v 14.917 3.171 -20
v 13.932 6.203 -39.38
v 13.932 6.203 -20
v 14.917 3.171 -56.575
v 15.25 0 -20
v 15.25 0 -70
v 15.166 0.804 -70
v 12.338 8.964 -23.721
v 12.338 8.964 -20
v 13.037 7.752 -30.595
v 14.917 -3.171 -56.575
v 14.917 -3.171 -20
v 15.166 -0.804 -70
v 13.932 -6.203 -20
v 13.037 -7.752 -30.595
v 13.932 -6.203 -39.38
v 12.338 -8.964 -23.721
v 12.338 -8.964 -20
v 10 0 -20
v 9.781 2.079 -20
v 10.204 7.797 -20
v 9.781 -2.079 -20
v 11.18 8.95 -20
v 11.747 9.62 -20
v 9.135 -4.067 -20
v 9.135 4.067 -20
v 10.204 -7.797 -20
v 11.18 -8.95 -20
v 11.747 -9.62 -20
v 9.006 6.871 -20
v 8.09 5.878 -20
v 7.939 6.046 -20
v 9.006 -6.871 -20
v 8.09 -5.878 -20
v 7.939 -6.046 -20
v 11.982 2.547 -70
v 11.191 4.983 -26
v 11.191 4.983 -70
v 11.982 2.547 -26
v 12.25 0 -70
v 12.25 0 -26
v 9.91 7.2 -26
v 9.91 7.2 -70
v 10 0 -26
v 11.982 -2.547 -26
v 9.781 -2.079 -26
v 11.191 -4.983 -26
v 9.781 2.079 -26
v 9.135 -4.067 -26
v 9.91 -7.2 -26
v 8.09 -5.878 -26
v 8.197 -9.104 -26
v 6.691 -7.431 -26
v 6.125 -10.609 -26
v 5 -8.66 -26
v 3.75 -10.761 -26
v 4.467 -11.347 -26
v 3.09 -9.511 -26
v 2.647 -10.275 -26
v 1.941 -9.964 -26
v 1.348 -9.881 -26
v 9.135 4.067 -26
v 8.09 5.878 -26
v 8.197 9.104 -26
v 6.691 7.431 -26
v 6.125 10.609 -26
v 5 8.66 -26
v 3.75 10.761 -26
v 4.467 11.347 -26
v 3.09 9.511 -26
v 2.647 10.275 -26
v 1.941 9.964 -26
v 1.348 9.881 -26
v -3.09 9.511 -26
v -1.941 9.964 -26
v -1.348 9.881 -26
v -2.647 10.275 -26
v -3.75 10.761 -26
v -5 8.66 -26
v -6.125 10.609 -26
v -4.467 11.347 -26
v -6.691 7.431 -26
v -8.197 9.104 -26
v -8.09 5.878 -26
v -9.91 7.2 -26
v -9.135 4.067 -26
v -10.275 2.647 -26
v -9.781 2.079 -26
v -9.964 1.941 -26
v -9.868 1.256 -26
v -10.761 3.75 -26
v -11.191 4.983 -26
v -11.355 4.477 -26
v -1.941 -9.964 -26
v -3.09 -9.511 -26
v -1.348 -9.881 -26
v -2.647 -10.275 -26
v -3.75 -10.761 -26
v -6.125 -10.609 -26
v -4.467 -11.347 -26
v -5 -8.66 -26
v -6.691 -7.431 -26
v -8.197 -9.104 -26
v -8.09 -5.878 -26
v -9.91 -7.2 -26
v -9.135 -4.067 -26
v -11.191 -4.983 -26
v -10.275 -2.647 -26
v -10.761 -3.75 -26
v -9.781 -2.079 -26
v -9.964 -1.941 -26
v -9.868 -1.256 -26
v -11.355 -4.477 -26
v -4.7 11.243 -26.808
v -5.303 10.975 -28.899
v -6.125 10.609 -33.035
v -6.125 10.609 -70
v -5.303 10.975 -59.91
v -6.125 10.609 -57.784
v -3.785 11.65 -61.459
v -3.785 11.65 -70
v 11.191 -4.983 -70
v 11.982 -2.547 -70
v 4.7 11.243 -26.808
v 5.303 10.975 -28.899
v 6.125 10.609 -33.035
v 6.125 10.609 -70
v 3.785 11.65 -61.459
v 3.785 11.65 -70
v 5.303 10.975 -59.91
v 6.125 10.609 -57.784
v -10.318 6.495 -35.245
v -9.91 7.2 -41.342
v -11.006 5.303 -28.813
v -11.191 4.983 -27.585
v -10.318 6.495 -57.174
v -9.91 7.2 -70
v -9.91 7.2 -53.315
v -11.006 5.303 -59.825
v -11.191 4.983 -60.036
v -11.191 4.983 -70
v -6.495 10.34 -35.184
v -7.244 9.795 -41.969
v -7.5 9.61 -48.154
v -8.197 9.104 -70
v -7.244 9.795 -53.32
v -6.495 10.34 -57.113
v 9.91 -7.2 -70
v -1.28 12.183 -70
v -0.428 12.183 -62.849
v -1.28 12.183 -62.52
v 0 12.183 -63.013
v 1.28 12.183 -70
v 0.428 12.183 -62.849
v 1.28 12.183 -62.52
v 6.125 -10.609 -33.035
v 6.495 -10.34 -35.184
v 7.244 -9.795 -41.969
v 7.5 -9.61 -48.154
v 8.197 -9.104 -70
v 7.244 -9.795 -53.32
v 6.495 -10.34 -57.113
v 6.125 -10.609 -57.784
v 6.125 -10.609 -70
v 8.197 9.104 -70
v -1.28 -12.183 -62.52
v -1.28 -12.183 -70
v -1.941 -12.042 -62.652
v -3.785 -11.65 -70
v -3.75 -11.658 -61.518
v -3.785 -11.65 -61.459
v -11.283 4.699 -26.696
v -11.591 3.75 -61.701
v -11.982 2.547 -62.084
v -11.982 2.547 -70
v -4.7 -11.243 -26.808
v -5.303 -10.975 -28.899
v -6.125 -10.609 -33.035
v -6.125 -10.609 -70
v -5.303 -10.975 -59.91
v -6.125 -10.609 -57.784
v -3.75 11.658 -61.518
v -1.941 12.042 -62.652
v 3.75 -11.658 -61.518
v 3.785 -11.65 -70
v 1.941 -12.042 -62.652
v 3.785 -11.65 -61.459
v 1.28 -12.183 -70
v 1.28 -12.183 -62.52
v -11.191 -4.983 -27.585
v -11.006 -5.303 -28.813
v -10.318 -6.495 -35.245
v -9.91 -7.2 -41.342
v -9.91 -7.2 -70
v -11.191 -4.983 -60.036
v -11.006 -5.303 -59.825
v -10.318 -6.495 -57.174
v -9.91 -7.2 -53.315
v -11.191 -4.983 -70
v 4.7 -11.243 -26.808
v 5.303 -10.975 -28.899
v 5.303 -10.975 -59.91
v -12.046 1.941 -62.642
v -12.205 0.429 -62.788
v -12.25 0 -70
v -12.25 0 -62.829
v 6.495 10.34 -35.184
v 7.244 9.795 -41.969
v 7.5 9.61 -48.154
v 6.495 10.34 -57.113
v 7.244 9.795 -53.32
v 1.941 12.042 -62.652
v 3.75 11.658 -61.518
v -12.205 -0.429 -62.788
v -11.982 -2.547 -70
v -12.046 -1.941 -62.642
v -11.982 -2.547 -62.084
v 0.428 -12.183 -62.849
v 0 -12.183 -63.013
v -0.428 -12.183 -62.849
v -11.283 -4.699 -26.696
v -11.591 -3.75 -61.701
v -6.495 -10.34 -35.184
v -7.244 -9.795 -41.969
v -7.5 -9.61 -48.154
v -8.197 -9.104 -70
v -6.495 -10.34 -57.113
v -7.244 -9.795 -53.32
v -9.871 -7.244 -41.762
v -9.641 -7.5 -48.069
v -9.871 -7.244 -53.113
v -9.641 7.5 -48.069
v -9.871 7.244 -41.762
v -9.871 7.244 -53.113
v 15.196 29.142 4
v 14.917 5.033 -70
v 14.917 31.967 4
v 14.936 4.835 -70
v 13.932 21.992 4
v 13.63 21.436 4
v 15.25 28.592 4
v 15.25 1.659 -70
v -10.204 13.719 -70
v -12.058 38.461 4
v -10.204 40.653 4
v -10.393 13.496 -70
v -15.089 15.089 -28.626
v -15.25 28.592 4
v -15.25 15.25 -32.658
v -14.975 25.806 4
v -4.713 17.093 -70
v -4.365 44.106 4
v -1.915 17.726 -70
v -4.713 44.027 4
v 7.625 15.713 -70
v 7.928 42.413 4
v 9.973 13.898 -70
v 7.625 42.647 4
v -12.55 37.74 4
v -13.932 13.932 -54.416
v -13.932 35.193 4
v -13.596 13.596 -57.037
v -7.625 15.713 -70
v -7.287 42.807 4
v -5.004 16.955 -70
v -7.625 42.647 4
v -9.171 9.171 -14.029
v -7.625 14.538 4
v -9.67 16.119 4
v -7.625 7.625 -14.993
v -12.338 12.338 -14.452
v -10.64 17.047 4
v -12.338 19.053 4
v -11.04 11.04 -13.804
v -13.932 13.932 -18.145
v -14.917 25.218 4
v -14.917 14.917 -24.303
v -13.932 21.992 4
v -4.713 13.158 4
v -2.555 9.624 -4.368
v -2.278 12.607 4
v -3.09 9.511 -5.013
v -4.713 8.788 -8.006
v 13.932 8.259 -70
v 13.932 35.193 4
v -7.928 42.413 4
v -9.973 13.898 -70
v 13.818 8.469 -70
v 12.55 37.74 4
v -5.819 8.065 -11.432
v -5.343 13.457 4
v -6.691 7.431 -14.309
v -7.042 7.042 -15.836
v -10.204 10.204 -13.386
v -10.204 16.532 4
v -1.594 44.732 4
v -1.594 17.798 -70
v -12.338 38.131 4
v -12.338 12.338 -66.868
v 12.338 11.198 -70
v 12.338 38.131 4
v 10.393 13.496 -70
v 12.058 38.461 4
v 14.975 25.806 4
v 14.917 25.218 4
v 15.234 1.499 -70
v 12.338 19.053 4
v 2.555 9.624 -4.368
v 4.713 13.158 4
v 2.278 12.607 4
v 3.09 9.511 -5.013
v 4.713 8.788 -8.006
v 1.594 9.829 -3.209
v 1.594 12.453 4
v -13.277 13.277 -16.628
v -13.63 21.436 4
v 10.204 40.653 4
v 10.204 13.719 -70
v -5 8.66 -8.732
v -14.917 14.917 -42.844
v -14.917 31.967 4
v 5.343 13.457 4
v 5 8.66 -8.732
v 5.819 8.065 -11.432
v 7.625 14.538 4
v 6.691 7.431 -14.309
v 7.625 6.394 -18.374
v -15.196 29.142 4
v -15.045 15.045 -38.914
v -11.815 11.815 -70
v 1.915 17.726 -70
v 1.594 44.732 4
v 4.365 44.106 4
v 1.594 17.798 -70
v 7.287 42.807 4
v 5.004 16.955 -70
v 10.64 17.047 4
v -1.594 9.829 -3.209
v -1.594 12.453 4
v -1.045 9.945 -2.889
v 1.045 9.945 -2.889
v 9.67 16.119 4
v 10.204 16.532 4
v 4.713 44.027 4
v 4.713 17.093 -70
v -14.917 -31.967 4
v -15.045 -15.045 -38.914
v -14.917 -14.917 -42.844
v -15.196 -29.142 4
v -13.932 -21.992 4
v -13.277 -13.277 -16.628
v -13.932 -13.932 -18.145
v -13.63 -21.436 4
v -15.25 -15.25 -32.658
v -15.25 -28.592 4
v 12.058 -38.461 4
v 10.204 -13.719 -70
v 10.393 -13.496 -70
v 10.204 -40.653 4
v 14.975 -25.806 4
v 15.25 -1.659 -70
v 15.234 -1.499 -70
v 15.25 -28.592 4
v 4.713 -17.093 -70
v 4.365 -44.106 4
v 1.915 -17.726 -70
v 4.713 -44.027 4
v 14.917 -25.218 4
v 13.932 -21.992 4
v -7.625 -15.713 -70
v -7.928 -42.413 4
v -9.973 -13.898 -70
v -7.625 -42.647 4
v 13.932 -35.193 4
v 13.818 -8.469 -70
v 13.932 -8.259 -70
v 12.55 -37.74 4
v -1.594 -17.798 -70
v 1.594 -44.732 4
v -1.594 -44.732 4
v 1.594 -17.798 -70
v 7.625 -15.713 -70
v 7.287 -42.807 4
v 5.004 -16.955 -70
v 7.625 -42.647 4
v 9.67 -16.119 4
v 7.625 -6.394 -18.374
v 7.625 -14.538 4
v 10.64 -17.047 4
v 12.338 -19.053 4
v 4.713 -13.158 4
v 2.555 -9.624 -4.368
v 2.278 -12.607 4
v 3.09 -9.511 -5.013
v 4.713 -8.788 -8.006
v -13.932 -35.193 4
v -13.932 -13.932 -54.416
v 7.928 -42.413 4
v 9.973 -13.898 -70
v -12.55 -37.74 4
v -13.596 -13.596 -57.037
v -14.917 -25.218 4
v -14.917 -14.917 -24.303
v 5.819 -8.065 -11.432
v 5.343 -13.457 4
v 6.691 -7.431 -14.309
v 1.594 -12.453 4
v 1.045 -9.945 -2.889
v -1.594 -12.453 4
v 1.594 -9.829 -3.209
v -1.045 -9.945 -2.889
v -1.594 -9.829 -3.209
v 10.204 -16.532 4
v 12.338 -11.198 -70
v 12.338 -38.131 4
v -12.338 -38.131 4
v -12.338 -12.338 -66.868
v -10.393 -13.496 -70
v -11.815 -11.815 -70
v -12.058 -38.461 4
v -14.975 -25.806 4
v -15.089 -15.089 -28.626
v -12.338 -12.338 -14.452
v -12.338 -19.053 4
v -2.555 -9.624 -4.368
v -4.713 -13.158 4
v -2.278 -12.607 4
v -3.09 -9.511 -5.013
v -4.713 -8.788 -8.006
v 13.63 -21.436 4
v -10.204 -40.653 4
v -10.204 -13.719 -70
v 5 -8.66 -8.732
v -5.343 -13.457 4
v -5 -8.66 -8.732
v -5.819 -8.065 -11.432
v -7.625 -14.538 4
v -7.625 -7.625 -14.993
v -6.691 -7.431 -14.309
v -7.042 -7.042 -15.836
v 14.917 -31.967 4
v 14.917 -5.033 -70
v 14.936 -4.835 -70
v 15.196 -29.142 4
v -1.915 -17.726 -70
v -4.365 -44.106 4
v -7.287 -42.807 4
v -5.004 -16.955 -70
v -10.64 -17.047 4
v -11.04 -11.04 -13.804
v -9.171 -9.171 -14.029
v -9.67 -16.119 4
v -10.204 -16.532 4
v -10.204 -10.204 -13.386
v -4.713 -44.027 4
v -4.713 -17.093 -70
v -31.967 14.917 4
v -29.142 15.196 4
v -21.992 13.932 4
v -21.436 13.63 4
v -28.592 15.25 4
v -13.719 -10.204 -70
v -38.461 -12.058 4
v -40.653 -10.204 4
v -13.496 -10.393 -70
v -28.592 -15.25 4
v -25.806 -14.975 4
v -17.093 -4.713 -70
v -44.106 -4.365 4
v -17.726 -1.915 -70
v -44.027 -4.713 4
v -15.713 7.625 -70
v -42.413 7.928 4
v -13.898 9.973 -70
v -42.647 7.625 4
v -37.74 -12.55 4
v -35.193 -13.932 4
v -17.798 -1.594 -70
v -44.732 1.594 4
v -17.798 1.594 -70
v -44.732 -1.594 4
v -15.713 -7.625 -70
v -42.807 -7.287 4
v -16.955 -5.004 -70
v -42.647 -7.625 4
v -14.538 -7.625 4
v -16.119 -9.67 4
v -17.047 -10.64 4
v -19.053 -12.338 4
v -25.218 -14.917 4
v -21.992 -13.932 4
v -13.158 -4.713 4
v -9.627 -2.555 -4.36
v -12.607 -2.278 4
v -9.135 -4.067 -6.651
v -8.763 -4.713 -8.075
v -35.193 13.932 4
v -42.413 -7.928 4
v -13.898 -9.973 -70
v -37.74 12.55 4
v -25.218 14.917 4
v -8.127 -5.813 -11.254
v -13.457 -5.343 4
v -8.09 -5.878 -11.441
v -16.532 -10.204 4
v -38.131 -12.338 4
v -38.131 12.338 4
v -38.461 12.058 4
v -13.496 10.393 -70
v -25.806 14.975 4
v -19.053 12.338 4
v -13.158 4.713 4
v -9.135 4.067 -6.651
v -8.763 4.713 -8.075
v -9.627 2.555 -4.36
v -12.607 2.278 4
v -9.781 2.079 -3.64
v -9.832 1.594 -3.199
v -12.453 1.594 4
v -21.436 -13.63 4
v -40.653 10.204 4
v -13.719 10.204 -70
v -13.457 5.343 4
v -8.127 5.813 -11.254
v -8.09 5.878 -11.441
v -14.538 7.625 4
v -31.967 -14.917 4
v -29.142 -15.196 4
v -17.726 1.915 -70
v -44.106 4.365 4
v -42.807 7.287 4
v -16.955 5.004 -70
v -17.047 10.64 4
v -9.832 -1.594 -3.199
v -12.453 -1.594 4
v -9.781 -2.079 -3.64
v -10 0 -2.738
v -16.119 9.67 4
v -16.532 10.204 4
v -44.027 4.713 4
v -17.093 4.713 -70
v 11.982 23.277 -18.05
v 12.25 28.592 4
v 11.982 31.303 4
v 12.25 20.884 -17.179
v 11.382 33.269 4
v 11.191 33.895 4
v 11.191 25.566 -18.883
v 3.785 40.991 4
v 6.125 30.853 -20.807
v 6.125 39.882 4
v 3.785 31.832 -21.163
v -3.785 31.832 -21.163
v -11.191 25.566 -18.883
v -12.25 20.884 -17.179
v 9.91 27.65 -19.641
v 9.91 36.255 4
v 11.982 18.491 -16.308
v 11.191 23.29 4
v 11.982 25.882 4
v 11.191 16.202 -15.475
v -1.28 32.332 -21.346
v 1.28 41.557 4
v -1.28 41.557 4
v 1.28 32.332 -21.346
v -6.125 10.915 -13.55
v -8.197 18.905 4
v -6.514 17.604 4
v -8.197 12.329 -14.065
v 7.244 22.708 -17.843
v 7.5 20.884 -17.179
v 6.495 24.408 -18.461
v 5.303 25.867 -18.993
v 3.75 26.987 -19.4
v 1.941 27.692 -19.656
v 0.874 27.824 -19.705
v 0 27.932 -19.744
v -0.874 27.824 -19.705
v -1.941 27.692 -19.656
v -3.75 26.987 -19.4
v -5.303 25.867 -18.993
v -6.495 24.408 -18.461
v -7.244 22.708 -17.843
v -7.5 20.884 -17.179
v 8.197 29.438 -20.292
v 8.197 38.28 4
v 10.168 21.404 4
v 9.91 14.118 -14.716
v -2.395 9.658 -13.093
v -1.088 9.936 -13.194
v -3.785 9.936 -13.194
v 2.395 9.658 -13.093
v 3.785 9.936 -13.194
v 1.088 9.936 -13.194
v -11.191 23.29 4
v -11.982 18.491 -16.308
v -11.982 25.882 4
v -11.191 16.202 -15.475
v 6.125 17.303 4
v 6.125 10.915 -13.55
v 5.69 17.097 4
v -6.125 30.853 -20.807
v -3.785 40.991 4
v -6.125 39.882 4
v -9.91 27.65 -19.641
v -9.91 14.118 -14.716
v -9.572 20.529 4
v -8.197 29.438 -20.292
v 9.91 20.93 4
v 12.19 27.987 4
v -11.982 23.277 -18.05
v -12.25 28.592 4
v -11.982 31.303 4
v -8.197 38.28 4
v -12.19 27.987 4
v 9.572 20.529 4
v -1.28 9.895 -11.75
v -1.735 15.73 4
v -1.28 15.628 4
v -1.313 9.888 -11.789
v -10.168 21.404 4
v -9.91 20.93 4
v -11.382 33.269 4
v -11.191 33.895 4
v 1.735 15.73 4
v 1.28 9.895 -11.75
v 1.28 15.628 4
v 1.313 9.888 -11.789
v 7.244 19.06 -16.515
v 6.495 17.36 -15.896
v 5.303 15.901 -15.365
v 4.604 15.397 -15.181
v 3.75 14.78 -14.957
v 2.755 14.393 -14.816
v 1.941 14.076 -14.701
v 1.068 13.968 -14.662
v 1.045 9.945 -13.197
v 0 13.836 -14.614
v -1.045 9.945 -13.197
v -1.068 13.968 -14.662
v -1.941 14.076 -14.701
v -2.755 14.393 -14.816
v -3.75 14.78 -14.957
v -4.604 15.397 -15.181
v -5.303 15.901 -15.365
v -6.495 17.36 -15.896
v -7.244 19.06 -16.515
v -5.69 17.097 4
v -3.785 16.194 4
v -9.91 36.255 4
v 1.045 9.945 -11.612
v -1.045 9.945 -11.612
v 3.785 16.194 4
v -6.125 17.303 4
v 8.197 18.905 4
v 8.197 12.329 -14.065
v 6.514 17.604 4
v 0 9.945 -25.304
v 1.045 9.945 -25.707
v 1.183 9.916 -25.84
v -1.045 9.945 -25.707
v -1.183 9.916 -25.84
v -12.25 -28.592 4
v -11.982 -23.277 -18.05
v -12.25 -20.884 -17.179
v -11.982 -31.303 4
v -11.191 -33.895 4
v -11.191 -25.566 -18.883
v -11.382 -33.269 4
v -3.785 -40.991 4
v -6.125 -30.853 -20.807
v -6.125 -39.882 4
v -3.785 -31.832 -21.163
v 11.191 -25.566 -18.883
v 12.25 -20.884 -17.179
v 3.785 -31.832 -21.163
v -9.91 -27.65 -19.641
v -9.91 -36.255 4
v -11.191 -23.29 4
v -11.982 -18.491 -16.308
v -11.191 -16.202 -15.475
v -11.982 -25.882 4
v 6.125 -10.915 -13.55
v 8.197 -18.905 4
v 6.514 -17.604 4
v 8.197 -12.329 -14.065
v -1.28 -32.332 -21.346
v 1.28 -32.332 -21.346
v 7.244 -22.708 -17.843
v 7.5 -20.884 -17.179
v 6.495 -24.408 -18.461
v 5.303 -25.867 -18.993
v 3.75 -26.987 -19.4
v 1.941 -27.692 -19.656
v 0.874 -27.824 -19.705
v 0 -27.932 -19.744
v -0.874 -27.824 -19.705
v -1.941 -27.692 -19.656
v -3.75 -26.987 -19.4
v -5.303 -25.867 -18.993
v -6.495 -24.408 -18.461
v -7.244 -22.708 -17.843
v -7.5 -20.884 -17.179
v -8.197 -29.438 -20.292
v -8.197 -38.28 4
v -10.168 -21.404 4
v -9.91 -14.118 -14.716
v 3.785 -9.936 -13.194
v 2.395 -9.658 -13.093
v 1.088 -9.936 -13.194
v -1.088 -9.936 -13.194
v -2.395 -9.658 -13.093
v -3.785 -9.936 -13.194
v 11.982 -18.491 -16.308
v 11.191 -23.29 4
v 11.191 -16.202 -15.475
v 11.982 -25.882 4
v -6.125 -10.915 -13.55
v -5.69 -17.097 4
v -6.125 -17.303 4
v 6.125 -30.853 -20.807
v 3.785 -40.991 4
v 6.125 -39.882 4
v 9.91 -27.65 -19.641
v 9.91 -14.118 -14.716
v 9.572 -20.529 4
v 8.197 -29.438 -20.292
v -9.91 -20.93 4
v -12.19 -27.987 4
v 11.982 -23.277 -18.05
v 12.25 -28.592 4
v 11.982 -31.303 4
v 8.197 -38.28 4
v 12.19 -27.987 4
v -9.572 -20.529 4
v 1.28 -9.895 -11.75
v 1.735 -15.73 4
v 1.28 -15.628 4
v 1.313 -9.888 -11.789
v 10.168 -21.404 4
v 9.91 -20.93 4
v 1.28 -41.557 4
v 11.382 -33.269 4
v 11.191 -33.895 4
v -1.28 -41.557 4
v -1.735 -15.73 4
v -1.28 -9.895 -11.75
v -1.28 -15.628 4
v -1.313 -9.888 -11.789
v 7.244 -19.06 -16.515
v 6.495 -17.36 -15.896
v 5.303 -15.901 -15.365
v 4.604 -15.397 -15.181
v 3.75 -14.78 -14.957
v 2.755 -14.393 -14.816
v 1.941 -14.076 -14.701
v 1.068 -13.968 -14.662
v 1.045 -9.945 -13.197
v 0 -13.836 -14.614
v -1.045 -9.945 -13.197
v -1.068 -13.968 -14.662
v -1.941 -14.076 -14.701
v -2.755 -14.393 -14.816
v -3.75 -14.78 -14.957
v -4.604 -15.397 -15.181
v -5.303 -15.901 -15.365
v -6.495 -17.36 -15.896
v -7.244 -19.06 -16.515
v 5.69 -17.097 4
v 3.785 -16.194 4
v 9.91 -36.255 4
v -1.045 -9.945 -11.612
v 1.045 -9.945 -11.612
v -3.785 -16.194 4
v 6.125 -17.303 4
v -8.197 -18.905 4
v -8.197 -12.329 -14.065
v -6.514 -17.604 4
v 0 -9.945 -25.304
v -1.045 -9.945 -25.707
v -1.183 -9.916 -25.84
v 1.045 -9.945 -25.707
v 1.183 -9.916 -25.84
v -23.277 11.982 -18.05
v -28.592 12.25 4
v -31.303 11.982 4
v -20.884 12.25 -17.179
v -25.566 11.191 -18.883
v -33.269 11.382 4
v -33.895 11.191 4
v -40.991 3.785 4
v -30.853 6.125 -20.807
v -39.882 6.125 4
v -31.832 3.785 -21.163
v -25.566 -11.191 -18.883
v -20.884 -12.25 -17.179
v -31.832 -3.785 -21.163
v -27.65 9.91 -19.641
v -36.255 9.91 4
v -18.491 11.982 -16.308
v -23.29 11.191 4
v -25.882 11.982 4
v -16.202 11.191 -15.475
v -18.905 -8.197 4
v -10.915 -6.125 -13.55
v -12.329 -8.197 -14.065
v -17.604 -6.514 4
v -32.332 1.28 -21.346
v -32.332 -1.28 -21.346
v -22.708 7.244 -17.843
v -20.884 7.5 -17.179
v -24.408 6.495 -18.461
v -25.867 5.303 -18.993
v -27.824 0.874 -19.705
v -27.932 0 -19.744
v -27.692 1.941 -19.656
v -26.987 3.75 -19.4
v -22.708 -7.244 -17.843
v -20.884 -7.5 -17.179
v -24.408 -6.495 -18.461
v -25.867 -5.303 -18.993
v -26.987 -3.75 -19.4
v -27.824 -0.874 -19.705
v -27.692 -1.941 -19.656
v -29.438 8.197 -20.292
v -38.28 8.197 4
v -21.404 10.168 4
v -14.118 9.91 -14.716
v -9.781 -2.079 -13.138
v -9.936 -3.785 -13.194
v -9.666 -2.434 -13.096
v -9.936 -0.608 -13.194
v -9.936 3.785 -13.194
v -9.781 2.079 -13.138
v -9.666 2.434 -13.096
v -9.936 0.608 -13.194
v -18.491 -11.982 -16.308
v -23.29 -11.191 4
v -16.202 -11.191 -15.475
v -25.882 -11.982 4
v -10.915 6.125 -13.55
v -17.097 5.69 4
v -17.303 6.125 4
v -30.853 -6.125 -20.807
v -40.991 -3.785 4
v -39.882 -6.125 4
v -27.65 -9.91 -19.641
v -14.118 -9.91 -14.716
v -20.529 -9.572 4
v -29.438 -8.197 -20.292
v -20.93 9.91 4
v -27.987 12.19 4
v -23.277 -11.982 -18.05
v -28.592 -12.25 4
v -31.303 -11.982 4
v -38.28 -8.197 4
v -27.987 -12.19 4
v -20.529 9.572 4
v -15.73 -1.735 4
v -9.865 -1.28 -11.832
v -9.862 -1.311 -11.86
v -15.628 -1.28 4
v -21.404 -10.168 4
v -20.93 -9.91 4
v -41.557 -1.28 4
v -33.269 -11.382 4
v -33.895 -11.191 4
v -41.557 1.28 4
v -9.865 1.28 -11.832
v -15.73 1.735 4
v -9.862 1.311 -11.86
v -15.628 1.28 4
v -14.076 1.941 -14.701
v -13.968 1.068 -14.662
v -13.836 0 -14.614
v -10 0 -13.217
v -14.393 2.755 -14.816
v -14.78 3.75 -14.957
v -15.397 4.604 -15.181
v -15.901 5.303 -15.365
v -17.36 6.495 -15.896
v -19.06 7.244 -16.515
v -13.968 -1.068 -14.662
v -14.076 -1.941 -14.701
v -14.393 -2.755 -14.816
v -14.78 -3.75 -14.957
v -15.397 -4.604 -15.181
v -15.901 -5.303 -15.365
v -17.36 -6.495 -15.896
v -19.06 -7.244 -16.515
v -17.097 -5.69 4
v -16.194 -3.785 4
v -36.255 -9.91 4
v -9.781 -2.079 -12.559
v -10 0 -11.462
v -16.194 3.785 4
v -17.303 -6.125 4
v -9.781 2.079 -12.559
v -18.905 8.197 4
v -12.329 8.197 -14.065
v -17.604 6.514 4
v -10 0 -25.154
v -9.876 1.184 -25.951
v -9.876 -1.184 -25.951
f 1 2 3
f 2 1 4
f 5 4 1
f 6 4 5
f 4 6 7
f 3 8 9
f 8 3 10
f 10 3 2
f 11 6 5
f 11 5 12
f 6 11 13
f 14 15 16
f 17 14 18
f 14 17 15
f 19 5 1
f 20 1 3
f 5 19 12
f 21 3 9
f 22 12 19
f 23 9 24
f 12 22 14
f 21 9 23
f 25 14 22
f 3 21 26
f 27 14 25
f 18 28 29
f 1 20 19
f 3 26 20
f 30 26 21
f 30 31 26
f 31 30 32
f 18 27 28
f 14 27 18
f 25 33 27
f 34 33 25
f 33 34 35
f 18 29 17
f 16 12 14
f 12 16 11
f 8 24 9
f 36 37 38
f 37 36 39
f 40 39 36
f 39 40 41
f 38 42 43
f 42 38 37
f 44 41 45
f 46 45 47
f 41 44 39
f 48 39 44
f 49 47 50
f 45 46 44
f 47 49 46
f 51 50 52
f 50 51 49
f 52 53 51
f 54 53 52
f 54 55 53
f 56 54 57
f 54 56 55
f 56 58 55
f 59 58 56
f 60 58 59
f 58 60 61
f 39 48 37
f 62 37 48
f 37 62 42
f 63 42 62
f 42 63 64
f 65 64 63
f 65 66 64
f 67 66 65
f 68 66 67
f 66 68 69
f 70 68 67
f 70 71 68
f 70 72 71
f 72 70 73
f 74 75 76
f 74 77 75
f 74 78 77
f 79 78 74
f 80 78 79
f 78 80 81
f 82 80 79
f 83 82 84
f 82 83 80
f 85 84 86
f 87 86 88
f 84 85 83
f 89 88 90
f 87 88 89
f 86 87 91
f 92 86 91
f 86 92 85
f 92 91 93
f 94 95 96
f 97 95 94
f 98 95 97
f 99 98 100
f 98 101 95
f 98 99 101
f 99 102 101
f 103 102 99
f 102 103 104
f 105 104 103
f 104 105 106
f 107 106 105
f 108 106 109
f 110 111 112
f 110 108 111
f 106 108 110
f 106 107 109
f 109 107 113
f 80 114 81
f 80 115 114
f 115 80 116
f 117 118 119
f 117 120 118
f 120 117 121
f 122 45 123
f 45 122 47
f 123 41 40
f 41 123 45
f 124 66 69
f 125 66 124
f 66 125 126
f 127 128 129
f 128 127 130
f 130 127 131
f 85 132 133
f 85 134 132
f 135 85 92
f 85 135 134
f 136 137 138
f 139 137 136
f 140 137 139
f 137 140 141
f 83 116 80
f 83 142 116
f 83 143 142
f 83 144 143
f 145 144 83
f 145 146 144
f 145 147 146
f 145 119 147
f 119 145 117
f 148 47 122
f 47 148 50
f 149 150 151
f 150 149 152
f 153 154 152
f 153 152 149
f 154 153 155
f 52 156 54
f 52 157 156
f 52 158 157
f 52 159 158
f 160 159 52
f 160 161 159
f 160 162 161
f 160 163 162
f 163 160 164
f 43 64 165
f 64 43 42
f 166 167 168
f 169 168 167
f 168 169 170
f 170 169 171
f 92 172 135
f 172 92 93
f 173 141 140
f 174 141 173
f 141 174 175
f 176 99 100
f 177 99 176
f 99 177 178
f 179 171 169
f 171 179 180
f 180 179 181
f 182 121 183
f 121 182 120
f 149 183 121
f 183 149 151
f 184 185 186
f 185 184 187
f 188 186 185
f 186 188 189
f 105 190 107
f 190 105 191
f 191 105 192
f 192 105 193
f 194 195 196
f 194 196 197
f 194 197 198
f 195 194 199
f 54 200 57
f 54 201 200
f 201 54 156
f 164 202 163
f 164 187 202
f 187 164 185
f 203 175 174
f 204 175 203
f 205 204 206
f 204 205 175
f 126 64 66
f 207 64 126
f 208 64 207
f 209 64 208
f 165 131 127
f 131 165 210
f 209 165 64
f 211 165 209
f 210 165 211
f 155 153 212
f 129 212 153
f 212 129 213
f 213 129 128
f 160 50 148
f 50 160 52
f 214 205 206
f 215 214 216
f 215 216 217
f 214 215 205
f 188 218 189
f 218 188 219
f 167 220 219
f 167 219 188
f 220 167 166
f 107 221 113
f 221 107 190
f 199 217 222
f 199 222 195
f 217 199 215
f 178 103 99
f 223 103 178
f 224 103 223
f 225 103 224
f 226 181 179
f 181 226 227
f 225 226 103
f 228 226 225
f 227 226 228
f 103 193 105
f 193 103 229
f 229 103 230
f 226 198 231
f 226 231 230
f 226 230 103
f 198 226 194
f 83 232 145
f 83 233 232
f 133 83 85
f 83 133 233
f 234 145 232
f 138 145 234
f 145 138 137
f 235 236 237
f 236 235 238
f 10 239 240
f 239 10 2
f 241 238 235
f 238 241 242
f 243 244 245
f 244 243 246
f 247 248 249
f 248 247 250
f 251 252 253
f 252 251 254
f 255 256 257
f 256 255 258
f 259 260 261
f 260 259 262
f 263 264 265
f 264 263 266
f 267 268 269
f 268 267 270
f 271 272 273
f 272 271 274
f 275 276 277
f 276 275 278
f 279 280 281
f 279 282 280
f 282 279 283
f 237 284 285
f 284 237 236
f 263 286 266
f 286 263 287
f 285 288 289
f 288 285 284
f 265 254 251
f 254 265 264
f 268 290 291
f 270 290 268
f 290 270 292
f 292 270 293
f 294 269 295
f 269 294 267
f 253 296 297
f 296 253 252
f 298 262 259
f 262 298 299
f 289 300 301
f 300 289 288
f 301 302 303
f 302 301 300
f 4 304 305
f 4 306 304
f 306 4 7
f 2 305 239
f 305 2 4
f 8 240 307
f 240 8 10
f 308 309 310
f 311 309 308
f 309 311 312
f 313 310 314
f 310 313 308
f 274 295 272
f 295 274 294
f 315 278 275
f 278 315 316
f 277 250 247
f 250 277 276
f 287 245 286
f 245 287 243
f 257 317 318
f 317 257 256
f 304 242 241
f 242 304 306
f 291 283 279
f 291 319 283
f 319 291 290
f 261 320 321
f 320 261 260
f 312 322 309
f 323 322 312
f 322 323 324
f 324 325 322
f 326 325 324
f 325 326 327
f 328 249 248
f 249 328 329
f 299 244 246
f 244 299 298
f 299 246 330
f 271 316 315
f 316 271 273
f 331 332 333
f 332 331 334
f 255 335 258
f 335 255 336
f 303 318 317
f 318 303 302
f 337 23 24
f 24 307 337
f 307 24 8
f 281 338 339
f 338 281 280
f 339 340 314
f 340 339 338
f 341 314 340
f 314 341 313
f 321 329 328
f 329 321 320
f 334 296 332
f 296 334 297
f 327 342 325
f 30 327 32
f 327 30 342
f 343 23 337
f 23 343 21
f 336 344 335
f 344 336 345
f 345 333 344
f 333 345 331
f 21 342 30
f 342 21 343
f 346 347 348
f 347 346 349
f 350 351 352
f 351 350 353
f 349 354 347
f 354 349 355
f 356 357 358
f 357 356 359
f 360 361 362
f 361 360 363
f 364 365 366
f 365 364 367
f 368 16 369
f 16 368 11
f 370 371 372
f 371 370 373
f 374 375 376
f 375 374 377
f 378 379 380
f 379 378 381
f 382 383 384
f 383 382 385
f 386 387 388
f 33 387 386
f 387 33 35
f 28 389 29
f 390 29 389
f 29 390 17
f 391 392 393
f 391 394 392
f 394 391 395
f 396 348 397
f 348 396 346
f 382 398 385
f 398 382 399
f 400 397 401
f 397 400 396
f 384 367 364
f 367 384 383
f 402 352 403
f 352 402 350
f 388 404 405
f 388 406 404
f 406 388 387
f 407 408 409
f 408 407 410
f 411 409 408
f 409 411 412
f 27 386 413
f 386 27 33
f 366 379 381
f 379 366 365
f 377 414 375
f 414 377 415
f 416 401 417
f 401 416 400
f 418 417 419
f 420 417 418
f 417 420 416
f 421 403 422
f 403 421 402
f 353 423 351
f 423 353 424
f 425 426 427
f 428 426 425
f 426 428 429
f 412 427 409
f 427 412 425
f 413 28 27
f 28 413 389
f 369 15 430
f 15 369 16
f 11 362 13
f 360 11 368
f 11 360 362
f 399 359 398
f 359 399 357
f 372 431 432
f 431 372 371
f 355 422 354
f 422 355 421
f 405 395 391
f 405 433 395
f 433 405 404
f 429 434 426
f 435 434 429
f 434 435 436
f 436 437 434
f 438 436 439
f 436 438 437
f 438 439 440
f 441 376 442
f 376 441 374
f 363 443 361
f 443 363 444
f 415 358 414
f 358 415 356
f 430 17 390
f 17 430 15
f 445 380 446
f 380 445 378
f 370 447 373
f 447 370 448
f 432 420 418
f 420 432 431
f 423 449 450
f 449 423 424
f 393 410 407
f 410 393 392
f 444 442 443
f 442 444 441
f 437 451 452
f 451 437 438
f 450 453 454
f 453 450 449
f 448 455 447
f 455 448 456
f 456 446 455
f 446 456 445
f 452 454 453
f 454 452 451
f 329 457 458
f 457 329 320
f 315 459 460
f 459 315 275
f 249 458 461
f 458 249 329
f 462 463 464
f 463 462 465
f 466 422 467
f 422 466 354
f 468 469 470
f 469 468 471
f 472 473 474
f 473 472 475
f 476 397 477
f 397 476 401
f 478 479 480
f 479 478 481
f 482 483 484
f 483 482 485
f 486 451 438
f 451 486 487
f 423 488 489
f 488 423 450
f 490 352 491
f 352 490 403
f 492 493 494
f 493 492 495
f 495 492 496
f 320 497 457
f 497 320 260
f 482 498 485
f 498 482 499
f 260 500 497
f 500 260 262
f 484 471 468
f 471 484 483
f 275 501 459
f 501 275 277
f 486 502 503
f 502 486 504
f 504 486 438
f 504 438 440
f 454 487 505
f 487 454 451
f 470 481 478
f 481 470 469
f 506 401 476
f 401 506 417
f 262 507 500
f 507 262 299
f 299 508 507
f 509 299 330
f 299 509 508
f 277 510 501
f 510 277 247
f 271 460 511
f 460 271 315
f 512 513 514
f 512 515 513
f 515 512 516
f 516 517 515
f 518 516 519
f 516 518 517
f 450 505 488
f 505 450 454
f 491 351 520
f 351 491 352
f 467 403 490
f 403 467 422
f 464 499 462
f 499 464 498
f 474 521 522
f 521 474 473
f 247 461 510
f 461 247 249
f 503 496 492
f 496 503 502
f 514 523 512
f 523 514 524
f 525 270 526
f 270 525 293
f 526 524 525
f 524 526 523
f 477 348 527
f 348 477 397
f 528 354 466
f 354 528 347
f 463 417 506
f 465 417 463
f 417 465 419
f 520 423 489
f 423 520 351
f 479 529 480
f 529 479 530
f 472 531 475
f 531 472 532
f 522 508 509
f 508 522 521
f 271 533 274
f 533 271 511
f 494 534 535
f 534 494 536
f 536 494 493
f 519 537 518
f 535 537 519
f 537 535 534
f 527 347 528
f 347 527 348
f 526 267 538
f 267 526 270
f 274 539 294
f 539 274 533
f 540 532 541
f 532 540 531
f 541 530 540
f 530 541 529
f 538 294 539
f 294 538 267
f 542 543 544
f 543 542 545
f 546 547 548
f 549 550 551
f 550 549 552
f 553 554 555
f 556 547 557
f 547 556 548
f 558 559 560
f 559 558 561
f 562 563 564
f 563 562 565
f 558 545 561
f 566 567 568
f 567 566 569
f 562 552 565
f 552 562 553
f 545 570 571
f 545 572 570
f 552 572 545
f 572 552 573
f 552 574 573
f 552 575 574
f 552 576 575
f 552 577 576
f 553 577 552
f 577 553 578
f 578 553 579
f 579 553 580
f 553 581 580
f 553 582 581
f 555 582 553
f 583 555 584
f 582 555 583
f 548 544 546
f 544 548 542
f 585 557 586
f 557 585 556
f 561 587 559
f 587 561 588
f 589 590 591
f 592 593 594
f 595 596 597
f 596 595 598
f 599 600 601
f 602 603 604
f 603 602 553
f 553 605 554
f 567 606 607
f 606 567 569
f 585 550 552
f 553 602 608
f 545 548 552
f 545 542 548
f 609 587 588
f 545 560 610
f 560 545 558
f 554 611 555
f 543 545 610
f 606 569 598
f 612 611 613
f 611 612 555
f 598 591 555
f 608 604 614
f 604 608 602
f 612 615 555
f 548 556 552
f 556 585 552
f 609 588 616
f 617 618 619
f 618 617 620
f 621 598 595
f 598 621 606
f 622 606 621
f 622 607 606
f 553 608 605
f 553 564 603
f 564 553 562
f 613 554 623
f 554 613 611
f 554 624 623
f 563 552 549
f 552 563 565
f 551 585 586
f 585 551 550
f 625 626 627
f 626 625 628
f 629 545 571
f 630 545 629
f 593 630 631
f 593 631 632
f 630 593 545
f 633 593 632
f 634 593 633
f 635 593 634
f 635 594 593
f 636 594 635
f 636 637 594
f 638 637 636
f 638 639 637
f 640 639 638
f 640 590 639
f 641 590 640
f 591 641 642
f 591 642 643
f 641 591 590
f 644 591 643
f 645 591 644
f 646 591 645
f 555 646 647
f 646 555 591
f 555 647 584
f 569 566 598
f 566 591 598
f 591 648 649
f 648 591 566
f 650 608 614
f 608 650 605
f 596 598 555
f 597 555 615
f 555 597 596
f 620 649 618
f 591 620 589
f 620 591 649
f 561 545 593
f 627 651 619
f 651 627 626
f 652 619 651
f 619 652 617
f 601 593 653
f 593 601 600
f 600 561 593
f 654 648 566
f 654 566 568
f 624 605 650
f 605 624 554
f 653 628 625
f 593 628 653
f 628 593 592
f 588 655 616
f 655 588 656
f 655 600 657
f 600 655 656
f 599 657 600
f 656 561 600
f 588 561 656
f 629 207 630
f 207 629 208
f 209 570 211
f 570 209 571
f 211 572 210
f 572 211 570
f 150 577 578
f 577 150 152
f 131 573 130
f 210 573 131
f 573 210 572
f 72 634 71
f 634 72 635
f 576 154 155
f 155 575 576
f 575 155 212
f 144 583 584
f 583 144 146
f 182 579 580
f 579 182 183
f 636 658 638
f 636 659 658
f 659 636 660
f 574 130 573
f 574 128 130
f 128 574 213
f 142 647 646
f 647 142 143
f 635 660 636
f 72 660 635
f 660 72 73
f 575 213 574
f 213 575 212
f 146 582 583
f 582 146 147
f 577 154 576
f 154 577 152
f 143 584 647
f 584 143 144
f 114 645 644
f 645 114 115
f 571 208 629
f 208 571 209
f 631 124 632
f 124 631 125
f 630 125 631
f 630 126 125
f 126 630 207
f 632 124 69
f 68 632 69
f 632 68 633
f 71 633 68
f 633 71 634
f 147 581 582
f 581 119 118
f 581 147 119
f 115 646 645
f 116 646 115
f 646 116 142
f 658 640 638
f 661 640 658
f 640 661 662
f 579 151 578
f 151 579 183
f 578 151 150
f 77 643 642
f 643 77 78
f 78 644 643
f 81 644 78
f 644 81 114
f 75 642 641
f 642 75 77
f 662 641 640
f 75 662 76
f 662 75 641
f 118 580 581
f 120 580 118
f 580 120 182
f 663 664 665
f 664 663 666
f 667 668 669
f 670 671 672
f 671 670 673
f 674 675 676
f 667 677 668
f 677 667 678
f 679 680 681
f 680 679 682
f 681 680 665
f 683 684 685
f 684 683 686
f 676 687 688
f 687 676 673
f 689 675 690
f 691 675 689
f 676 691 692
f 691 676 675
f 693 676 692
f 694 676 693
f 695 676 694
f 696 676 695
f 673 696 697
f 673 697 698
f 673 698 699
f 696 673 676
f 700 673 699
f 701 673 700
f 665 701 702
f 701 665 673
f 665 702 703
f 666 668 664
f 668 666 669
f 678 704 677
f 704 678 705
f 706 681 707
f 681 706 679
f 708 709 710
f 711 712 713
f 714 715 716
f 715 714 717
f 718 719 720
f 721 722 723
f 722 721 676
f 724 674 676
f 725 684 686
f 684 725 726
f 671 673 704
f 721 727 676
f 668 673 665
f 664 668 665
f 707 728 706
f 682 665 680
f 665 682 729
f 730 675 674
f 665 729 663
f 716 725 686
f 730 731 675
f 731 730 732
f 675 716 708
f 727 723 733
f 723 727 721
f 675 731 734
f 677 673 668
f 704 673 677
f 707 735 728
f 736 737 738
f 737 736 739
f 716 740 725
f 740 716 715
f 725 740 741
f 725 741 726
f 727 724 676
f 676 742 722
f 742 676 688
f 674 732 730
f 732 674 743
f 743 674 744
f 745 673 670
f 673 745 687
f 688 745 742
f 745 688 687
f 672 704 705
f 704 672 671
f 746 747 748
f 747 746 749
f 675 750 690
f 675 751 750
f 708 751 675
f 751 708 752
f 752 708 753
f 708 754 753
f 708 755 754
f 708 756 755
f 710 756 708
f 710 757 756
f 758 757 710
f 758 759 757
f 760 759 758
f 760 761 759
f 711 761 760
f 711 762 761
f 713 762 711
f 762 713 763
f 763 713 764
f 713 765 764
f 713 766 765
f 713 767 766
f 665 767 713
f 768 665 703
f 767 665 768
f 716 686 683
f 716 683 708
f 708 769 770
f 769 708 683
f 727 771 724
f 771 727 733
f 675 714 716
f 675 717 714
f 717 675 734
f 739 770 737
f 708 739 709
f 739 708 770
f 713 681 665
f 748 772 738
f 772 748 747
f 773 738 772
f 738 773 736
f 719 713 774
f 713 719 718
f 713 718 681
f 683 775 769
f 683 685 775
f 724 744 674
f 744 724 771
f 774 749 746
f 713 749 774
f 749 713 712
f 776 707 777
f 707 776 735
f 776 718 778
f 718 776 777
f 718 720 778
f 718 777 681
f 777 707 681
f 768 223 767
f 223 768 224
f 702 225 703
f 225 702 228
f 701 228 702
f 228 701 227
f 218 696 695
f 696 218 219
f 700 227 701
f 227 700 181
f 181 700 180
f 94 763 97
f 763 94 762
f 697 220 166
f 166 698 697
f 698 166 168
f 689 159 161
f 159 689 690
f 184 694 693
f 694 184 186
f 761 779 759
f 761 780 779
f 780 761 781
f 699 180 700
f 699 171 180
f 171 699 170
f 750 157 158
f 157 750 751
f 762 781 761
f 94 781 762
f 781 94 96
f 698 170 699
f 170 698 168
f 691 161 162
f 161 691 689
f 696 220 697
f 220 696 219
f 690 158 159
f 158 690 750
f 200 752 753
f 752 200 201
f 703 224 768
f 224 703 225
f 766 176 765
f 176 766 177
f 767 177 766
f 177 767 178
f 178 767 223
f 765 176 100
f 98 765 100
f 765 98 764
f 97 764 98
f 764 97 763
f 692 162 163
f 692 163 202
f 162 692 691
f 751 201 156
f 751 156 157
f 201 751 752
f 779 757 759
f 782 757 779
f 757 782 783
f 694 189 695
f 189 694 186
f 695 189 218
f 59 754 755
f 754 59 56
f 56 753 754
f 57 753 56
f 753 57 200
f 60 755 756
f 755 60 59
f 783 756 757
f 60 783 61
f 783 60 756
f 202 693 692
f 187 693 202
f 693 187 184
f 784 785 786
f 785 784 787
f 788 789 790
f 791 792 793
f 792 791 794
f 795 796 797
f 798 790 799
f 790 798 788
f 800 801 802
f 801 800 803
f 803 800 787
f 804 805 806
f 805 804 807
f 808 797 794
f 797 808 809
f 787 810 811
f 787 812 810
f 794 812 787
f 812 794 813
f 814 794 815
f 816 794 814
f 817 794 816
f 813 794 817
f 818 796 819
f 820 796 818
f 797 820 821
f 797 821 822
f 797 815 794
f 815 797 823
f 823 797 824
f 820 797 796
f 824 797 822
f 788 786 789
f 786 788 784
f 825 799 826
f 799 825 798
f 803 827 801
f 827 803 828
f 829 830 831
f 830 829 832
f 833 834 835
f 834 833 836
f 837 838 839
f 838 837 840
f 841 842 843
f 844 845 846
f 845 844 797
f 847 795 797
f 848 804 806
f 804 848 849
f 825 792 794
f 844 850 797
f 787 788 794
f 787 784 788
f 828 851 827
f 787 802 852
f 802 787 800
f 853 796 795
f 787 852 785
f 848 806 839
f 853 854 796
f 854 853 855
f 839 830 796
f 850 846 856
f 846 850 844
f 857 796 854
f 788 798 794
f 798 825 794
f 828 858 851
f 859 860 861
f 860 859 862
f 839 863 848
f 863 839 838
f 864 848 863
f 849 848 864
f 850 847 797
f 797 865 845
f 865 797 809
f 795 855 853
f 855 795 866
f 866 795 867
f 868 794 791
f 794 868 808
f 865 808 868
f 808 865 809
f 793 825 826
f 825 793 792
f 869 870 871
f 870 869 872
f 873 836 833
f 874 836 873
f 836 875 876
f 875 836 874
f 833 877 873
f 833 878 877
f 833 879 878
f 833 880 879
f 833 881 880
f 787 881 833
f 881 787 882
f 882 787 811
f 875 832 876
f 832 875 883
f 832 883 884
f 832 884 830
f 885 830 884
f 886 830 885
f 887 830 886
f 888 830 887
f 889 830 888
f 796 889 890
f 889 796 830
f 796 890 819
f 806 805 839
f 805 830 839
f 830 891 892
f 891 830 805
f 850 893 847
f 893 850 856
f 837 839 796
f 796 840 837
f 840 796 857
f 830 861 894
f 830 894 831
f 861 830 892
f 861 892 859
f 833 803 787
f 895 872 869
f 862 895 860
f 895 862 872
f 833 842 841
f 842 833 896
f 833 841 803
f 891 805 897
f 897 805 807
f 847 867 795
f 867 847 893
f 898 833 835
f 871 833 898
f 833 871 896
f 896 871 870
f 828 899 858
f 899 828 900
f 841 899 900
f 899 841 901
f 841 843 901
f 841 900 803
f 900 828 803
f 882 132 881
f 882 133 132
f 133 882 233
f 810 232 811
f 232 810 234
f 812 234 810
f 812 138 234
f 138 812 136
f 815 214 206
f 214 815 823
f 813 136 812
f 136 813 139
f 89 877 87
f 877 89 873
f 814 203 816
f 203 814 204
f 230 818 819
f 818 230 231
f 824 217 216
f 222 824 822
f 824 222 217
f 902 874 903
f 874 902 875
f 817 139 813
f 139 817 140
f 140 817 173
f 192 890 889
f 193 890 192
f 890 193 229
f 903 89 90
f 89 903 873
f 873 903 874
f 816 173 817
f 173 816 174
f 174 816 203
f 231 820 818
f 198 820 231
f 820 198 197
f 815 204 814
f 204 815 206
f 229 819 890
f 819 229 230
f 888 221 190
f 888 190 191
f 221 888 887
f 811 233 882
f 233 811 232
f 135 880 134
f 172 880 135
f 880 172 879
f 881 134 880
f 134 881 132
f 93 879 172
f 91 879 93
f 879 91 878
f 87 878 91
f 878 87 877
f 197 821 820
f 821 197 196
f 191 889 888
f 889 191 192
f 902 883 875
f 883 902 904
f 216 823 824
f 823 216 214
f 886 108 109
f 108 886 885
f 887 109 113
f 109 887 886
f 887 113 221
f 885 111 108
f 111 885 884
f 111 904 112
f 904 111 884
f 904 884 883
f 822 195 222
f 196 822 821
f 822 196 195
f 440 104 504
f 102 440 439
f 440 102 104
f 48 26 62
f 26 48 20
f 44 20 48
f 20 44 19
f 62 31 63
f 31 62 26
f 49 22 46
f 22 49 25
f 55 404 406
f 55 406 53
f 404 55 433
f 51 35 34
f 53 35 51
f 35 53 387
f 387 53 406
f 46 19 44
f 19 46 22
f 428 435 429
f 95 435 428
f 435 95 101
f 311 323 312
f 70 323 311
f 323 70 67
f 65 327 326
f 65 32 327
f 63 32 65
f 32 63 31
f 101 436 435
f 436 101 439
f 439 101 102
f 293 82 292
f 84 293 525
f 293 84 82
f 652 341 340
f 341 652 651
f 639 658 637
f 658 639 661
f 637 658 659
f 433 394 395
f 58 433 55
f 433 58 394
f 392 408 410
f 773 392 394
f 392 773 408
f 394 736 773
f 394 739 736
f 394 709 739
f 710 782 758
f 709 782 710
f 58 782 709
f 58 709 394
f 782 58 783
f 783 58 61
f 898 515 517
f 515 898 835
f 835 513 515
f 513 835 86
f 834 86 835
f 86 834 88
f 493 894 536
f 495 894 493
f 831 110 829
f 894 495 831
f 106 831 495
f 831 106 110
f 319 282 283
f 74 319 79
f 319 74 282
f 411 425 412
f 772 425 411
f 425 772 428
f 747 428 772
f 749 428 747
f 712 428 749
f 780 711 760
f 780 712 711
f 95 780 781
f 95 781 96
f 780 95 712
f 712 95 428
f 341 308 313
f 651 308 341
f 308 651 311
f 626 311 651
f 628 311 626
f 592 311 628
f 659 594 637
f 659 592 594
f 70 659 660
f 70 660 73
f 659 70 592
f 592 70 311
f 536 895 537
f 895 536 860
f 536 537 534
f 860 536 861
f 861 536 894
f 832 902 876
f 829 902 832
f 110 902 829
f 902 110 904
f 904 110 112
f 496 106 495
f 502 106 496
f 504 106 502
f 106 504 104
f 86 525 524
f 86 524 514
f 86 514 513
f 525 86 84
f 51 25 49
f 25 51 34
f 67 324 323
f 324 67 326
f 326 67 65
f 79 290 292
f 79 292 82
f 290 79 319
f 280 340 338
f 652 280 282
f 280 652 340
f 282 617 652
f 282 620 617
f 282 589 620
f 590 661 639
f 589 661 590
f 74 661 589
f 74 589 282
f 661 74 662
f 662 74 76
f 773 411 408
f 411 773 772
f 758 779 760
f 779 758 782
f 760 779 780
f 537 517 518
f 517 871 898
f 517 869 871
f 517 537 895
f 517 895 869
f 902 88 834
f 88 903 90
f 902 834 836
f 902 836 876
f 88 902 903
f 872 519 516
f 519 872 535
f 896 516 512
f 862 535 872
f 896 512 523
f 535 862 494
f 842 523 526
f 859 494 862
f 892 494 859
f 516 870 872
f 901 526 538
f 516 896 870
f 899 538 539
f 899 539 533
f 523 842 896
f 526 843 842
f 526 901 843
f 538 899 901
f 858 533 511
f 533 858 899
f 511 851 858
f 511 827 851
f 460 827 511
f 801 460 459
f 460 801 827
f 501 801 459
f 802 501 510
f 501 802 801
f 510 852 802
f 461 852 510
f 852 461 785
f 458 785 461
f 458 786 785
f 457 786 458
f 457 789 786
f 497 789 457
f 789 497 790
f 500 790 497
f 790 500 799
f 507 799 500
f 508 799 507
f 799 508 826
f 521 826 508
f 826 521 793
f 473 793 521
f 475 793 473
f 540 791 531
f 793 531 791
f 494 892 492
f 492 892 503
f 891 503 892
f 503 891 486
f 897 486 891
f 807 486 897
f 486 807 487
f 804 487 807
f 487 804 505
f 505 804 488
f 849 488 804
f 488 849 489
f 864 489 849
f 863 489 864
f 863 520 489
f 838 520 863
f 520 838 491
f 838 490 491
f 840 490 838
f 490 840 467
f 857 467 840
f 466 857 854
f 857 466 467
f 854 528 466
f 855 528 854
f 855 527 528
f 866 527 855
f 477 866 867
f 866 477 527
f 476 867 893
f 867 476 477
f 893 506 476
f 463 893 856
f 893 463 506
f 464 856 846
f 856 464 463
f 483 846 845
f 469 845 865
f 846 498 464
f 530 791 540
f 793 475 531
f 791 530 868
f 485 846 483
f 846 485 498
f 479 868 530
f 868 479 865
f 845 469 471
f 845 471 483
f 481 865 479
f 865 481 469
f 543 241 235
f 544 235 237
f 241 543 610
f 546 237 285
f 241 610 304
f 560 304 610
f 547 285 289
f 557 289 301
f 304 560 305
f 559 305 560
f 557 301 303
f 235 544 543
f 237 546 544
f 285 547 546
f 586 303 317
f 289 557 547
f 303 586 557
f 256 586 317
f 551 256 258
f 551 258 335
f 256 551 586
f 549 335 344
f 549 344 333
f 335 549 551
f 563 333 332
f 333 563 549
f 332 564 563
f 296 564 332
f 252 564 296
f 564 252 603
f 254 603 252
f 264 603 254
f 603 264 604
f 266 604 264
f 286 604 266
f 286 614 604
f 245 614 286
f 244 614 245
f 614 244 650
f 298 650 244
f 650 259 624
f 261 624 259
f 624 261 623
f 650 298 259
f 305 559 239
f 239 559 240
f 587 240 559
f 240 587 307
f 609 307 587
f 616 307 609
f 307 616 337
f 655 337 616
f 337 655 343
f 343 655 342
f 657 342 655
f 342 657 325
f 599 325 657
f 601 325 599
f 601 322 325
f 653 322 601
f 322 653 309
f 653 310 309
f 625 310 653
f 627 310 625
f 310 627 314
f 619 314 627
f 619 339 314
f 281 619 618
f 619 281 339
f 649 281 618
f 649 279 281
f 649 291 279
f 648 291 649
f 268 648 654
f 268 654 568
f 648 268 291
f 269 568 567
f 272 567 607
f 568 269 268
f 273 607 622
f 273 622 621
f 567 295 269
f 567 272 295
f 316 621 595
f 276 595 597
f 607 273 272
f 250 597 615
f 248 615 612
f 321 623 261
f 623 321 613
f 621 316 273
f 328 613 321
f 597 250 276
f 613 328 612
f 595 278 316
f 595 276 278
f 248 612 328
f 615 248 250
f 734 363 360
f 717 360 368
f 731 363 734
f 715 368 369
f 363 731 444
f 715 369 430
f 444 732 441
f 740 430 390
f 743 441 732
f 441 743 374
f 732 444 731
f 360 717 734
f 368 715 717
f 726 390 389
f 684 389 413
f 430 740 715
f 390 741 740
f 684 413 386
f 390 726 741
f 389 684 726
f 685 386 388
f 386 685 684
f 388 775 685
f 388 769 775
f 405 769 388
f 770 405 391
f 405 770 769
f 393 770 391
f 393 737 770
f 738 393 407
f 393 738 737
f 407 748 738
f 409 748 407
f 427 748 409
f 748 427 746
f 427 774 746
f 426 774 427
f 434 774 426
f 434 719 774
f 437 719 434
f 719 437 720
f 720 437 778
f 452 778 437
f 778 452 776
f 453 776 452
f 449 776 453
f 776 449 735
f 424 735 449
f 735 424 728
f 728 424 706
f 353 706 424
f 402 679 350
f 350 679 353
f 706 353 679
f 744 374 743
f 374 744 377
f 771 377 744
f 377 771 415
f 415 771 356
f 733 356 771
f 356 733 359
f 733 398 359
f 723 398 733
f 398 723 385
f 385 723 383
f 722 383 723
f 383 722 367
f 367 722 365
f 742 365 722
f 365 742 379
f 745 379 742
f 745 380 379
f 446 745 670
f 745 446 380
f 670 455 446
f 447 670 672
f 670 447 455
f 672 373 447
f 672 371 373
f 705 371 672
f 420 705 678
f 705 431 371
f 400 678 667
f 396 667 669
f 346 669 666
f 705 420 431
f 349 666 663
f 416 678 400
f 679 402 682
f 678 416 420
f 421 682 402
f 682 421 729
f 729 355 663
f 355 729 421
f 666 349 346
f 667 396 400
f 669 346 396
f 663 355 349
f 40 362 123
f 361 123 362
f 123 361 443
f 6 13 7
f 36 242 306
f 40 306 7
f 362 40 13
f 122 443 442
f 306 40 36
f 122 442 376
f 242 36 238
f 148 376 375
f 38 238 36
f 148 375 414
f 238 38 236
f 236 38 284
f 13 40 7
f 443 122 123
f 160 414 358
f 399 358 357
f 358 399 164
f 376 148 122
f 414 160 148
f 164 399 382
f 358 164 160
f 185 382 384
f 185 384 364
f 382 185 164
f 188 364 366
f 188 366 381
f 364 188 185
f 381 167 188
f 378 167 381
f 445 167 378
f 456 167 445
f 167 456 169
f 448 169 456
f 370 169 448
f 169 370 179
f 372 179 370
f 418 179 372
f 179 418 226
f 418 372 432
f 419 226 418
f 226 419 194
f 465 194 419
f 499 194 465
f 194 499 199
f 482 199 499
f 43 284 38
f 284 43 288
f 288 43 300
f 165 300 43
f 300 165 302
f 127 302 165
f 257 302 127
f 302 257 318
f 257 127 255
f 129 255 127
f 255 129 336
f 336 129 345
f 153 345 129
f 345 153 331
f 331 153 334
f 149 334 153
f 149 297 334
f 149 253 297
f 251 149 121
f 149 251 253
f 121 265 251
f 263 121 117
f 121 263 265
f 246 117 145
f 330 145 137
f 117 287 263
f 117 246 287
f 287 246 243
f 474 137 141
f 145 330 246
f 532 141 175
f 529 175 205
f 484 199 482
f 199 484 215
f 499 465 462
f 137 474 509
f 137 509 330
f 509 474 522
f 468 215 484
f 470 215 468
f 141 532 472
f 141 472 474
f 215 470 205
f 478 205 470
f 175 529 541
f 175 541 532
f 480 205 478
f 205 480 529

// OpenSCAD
// file: lib.scad
OD = 24.5;

module tube(od, id, h){
  difference(){
    color([1, .3, .6])cylinder(d=od, h=h);
    translate([0, 0, -1])cylinder(d=id, h=h + 2);
  }
}
// main file
include <lib.scad>

ID = 20;
angle = 20;
thickness=6;

module leg(){
  rotate([-angle, 0, 0])translate([0, OD+1, -9])cylinder(d=OD, h = 100);
  rotate([-angle, 0, 0])translate([0, OD+1, -99])cylinder(d=15, h = 200);
}
module insert(){
  color("red")
  rotate([-angle, 0, 0])translate([0, OD+1, -70])cylinder(d=OD + thickness, h = 100);
}

module legs(){
  leg();
  rotate([0, 0, 180])leg();
  rotate([0, 0, 90])leg();
}
module inserts(){
  insert();
  rotate([0, 0, 180])insert();
  rotate([0, 0, 90])insert();
}

module manifold(){
  translate([0, 0, -90])
    difference(){
    cylinder(h=70, d=OD + thickness);
    translate([0, 0, -thickness])cylinder(h=70, d=OD);
  }  
  difference(){
    inserts();
    legs();
  }
}

difference(){
  manifold();
  //translate([0, 0, -120-thickness])cylinder(h=110, d=OD);
translate([0, 0, -130-thickness])cylinder(h=110, d=OD);
translate([0, 0, -70])cylinder(h=110, d=ID);
legs();
translate([-500, -500, 4])cube(1000);
translate([-500, -500, -1070])cube(1000);
}
